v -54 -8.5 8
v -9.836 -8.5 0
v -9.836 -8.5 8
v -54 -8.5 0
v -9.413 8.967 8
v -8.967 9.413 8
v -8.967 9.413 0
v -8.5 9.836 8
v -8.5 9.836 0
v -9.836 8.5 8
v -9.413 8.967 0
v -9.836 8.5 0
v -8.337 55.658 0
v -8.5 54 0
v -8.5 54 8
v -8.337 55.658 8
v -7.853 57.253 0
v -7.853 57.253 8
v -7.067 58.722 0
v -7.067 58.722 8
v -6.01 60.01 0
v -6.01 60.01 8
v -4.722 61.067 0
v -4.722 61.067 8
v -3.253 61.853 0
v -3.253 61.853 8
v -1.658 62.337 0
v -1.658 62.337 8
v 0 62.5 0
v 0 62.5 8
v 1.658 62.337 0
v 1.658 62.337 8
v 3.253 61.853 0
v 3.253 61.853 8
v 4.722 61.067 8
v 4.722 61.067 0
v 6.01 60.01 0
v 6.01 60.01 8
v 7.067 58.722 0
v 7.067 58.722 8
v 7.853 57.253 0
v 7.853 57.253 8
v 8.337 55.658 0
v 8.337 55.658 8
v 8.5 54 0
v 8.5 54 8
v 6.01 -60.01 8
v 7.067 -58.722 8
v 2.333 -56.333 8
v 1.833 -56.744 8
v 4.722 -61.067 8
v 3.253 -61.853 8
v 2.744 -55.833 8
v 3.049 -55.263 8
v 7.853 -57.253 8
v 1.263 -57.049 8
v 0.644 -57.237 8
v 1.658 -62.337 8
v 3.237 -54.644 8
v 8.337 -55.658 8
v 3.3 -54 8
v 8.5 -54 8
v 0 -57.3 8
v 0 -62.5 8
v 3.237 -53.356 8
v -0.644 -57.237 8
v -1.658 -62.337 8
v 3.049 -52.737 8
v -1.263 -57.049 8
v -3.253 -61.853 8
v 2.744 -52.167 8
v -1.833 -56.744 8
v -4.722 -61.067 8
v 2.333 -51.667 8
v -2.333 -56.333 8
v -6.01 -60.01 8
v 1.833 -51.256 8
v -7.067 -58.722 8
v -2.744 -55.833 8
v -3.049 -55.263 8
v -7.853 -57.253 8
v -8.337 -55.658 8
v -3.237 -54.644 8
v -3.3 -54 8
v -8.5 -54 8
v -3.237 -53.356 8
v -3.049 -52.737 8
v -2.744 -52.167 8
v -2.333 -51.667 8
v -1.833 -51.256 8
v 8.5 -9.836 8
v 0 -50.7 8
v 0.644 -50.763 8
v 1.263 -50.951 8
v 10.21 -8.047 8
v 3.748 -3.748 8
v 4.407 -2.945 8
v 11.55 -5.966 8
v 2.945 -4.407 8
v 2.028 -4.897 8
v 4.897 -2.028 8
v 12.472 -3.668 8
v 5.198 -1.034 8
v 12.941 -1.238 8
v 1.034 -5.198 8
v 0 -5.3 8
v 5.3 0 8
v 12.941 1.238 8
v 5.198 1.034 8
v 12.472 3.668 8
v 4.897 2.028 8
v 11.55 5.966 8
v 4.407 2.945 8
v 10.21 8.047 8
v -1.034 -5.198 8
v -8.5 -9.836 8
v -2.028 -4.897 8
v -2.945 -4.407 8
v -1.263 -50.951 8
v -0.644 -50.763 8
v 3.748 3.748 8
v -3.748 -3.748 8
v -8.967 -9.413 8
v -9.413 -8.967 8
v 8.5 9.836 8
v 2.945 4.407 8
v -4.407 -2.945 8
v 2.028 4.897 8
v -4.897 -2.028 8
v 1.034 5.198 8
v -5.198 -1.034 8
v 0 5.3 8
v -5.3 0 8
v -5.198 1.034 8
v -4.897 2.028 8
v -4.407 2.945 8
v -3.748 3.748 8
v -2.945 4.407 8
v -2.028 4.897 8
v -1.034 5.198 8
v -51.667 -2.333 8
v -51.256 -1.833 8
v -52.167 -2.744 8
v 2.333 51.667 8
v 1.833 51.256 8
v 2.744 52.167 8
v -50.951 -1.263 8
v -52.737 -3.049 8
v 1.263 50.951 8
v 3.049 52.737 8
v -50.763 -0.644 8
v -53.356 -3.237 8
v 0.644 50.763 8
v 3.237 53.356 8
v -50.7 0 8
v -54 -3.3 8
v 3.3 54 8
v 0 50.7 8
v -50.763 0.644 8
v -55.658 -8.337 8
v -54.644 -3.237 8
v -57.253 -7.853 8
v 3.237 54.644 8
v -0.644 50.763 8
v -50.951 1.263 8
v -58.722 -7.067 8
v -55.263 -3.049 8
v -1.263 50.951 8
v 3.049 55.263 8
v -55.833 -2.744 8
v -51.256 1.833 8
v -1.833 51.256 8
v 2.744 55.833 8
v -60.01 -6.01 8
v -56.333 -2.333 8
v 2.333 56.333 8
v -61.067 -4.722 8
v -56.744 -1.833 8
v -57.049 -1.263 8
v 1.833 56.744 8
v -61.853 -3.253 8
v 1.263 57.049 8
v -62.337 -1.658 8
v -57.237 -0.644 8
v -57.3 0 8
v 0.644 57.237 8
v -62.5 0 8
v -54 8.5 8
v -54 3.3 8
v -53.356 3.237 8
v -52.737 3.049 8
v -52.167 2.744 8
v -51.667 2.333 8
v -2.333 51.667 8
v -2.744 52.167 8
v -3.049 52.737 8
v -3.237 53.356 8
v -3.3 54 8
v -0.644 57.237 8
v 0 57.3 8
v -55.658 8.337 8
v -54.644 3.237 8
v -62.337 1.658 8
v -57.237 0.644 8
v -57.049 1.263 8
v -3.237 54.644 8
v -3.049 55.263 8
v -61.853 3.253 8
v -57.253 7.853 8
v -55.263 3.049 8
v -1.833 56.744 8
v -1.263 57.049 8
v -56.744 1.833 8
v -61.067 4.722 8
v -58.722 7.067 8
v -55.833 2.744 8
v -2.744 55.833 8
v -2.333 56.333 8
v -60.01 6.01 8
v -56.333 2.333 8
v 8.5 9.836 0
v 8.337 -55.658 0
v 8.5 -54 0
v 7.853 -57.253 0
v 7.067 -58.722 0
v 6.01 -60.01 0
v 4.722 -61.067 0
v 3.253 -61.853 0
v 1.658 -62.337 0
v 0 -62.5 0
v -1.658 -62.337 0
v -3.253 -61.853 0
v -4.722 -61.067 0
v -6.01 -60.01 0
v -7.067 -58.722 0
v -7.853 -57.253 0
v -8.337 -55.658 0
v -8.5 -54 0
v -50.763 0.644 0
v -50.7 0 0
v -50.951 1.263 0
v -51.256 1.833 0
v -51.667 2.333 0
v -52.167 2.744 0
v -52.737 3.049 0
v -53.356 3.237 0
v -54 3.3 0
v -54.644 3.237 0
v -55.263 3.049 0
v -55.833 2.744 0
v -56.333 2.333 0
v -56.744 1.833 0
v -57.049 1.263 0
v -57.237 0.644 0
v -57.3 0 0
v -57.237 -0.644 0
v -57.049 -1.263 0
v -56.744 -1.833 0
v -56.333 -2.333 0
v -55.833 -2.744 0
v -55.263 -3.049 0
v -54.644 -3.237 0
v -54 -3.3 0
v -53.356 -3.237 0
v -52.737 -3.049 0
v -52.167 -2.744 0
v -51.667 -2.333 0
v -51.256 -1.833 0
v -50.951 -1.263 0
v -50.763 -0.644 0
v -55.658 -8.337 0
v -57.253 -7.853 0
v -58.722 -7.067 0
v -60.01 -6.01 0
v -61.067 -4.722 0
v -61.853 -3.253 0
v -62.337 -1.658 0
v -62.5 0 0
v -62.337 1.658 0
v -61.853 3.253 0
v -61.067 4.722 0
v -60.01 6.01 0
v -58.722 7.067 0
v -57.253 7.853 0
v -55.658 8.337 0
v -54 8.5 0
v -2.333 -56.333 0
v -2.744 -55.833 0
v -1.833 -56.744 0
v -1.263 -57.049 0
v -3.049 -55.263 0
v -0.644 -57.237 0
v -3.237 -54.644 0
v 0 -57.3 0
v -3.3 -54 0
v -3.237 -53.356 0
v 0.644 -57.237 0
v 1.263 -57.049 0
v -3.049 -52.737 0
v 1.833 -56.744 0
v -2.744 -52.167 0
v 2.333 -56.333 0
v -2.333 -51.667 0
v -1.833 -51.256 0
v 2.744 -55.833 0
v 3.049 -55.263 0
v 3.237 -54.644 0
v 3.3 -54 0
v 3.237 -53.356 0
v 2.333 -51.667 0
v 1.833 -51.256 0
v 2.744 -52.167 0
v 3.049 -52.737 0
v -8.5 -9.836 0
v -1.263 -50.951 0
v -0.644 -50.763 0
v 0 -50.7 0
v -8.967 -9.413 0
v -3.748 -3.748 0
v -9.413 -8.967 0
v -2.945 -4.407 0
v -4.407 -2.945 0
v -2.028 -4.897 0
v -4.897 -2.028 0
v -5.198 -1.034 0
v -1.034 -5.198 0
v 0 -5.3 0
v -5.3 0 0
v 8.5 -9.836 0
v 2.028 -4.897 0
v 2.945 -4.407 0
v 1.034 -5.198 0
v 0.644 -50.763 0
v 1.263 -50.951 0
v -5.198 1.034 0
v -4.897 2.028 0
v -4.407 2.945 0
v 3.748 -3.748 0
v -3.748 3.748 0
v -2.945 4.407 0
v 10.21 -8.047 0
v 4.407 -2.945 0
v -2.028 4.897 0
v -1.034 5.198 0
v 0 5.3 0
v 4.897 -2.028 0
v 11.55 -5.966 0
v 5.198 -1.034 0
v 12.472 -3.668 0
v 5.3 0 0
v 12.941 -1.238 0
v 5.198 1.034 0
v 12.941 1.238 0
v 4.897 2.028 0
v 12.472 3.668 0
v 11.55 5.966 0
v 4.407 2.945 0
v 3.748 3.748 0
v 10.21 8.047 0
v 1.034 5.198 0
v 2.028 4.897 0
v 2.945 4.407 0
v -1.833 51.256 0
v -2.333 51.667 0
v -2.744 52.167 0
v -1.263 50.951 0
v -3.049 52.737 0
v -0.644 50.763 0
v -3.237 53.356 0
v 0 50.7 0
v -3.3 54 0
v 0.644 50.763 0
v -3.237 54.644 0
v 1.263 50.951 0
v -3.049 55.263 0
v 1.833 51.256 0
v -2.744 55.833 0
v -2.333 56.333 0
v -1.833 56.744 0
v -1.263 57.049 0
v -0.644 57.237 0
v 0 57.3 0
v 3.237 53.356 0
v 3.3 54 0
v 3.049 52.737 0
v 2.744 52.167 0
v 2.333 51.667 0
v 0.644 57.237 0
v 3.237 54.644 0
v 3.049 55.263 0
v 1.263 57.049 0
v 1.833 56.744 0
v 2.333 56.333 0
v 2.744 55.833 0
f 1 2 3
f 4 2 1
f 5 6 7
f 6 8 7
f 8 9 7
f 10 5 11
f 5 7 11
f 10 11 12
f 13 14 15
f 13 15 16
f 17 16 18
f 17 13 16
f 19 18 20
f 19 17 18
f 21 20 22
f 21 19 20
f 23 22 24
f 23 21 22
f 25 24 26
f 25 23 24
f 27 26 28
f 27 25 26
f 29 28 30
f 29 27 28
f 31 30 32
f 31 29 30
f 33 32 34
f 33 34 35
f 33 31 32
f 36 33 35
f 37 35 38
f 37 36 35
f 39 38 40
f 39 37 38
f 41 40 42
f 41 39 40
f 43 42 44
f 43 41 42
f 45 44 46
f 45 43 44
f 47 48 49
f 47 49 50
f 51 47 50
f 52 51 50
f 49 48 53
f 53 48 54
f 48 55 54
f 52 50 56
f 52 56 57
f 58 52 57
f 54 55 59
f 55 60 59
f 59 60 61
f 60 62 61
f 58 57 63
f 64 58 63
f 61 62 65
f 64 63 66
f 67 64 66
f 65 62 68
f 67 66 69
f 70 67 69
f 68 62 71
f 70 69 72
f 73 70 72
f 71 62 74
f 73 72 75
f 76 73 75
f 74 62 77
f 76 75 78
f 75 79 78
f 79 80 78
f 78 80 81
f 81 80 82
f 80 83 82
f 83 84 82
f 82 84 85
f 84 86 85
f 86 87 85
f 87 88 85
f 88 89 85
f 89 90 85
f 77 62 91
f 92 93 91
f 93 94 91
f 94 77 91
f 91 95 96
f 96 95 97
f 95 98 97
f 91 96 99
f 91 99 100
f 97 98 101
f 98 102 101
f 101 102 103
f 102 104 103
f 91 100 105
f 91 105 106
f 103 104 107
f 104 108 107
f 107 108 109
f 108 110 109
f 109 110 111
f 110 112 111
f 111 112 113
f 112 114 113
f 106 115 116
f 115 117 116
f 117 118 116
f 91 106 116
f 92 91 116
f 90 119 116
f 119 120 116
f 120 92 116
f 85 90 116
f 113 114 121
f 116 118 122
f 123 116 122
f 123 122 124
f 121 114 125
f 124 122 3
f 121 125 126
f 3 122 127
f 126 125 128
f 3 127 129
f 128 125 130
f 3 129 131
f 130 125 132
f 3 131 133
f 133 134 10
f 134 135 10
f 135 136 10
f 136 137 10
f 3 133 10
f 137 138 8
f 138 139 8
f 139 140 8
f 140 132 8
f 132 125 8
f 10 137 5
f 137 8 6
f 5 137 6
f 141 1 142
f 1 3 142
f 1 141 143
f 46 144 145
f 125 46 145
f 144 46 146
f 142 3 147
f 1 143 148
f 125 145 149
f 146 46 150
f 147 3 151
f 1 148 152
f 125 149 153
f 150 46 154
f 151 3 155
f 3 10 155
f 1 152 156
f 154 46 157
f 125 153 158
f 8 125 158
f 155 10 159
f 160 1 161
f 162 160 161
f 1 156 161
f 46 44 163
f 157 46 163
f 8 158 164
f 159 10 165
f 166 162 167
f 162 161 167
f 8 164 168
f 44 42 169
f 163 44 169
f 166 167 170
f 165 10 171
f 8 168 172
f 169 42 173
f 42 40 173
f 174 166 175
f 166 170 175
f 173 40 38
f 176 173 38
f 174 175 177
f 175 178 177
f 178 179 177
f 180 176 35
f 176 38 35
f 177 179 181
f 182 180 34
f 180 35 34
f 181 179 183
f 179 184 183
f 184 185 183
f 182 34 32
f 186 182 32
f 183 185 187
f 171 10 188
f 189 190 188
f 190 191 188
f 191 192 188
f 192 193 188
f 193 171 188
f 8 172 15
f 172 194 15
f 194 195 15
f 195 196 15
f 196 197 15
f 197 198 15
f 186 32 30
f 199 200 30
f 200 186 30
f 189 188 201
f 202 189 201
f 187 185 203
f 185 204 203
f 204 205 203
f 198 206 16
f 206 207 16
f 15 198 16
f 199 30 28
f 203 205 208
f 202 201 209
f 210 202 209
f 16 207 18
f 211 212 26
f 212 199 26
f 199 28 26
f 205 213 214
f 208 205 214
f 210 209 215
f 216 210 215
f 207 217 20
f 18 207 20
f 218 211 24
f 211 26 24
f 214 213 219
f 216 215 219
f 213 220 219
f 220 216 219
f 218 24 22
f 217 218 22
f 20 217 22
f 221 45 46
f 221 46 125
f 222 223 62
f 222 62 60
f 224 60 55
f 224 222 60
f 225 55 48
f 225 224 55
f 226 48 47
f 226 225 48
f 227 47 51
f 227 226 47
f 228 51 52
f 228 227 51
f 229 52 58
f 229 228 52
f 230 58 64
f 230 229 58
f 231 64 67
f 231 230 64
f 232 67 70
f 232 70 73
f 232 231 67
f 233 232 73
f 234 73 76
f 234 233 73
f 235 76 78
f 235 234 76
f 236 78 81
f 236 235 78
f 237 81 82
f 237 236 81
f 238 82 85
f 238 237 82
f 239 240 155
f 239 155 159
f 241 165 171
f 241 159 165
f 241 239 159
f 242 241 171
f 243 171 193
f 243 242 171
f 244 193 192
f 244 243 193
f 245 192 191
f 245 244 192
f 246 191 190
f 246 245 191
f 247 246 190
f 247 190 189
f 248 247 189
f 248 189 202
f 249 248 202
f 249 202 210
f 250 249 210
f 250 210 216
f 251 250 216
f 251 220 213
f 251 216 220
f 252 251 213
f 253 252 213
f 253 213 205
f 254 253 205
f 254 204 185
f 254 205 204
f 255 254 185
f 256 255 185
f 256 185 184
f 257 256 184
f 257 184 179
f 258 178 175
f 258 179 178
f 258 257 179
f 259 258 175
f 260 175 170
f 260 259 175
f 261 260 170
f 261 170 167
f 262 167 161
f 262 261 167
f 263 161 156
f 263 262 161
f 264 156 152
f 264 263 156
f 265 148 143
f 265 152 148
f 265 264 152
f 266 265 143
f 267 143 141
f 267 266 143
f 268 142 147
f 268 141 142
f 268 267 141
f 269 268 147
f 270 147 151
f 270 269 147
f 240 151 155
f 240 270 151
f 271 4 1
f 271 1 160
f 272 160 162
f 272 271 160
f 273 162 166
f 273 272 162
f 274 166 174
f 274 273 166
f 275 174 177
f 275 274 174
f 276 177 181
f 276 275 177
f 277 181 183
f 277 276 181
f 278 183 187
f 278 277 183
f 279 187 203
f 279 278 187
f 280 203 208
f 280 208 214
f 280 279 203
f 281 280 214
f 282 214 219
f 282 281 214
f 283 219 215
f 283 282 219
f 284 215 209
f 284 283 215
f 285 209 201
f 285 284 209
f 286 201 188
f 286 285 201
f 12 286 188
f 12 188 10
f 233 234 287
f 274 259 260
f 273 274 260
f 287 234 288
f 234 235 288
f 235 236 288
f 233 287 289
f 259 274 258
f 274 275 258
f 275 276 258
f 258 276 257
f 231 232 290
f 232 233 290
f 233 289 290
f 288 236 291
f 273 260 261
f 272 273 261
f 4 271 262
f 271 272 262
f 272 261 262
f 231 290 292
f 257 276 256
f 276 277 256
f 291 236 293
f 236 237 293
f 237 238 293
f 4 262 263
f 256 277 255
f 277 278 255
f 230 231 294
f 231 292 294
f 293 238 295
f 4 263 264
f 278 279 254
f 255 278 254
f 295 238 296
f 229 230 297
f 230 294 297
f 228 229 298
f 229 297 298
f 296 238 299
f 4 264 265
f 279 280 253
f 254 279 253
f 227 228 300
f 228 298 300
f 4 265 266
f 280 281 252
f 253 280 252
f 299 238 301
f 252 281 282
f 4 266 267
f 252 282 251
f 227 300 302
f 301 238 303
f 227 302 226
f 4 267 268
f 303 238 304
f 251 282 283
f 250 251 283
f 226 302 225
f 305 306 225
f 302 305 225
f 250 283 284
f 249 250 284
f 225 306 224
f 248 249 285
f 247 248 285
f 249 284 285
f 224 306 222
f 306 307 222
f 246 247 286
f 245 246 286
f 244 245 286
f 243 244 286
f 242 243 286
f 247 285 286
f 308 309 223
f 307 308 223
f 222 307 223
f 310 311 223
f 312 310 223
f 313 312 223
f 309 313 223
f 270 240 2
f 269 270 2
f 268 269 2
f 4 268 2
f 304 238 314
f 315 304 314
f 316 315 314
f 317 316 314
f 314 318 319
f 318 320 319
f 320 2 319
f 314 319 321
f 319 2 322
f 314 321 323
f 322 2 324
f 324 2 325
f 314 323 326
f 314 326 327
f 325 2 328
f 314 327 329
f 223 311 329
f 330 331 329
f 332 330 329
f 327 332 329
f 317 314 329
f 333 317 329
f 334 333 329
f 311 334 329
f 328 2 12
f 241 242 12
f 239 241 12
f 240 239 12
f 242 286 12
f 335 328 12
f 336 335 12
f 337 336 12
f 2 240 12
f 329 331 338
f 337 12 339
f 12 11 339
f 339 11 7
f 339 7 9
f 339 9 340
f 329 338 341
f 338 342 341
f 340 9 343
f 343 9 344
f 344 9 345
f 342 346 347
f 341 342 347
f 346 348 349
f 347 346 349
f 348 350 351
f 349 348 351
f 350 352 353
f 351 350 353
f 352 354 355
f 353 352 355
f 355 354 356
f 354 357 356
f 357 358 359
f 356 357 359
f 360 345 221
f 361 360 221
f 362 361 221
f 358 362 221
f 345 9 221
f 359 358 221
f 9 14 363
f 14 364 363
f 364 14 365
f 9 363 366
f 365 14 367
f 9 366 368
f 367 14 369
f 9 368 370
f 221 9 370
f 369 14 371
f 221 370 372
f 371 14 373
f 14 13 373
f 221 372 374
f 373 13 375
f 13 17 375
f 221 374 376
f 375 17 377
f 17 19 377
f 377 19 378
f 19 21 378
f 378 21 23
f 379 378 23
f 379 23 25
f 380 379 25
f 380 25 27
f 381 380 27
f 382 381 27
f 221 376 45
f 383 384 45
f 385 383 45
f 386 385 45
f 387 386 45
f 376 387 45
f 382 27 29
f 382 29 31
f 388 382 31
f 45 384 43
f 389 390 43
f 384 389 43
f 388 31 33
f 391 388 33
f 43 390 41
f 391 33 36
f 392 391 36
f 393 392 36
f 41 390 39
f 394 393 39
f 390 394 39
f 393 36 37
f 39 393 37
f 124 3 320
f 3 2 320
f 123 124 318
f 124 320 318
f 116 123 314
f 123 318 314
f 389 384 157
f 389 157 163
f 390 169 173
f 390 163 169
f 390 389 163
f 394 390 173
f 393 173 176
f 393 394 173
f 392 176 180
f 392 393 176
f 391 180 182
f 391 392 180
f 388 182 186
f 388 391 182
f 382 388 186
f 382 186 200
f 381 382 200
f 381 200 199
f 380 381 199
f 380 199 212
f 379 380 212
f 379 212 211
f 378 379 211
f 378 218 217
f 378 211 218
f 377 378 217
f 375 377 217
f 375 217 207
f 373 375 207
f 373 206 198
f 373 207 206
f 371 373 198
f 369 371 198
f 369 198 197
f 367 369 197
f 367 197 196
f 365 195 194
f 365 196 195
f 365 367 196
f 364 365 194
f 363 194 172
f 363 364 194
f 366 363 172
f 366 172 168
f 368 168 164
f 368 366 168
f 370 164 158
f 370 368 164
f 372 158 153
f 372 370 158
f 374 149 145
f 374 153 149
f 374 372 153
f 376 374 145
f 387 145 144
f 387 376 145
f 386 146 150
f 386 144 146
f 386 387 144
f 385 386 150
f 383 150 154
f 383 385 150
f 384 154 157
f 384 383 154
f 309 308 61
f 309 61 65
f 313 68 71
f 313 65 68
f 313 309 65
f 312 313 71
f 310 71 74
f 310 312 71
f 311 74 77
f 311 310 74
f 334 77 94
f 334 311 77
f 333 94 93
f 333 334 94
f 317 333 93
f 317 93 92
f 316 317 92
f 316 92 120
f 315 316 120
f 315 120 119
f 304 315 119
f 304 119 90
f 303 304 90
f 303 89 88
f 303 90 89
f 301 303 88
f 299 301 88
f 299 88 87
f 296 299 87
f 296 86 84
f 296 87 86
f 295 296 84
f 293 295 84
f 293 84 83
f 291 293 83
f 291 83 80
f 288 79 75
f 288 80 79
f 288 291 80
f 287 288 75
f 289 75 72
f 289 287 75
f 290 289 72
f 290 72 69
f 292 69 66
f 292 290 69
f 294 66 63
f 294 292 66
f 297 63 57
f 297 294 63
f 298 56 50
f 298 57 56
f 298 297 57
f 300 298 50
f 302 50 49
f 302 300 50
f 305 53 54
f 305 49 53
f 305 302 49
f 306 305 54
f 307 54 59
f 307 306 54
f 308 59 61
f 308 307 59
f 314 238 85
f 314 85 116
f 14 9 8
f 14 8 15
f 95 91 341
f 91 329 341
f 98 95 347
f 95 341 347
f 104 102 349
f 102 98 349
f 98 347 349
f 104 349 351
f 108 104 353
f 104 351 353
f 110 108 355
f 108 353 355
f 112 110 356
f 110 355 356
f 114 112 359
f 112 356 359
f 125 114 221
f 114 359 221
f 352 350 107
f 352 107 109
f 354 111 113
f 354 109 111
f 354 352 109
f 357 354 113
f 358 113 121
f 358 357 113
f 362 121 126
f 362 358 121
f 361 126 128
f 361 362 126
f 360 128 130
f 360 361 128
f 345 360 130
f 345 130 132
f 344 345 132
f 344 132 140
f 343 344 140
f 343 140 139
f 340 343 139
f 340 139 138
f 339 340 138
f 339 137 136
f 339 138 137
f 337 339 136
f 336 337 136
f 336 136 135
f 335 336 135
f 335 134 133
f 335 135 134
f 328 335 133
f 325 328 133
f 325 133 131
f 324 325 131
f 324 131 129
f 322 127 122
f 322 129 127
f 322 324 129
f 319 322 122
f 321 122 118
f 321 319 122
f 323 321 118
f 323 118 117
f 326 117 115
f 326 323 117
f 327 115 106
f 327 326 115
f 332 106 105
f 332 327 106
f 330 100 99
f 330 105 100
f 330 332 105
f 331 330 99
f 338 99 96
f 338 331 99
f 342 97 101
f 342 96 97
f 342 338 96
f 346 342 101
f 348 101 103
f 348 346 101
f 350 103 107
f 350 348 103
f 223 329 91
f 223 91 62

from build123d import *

# Parameters (mm, degrees)
S01_CENTRAL_SPINDLE_PAD_R         = 13
F_01_CENTRAL_SPINDLE_PAD_DEPTH    = 8
F_02_CAGE_RIB_1_DEPTH             = 8
F_03_CAGE_RIB_2_DEPTH             = 8
F_04_CAGE_RIB_3_DEPTH             = 8
F_05_START                        = -1
S05_THREE_CAGE_BOLT_HOLES_R       = 3.3
F_05_THREE_CAGE_BOLT_HOLES_DEPTH  = 10
F_06_START                        = -1
S06_SPINDLE_STEM_CLEARANCE_R      = 5.3
F_06_SPINDLE_STEM_CLEARANCE_DEPTH = 10


with BuildPart() as part:
    # S01 - Central spindle pad → 01 - Central spindle pad (new body)
    with BuildSketch(Plane.XY):
        Circle(S01_CENTRAL_SPINDLE_PAD_R)
    extrude(amount=F_01_CENTRAL_SPINDLE_PAD_DEPTH)

    # S02 - Cage rib 1 → 02 - Cage rib 1 (add)
    with BuildSketch(Plane.XY):
        with BuildLine():
            Line((-8.5, 0), (-8.5, 54))
            ThreePointArc((-8.5, 54), (0, 62.5), (8.5, 54))
            Line((8.5, 54), (8.5, 0))
            ThreePointArc((8.5, 0), (0, -8.5), (-8.5, 0))
        make_face()
    extrude(amount=F_02_CAGE_RIB_1_DEPTH)

    # S03 - Cage rib 2 → 03 - Cage rib 2 (add)
    with BuildSketch(Plane.XY):
        with BuildLine():
            Line((0, -8.5), (-54, -8.5))
            ThreePointArc((-54, -8.5), (-62.5, 0), (-54, 8.5))
            Line((-54, 8.5), (0, 8.5))
            ThreePointArc((0, 8.5), (8.5, 0), (0, -8.5))
        make_face()
    extrude(amount=F_03_CAGE_RIB_2_DEPTH)

    # S04 - Cage rib 3 → 04 - Cage rib 3 (add)
    with BuildSketch(Plane.XY):
        with BuildLine():
            Line((8.5, 0), (8.5, -54))
            ThreePointArc((8.5, -54), (0, -62.5), (-8.5, -54))
            Line((-8.5, -54), (-8.5, 0))
            ThreePointArc((-8.5, 0), (0, 8.5), (8.5, 0))
        make_face()
    extrude(amount=F_04_CAGE_RIB_3_DEPTH)

    # S05 - Three cage bolt holes → 05 - Three cage bolt holes (cut)
    with BuildSketch(Plane.XY.offset(F_05_START)):
        with Locations((0, 54)):
            Circle(S05_THREE_CAGE_BOLT_HOLES_R)
        with Locations((-54, 0)):
            Circle(S05_THREE_CAGE_BOLT_HOLES_R)
        with Locations((0, -54)):
            Circle(S05_THREE_CAGE_BOLT_HOLES_R)
    extrude(amount=F_05_THREE_CAGE_BOLT_HOLES_DEPTH, mode=Mode.SUBTRACT)

    # S06 - Spindle stem clearance → 06 - Spindle stem clearance (cut)
    with BuildSketch(Plane.XY.offset(F_06_START)):
        Circle(S06_SPINDLE_STEM_CLEARANCE_R)
    extrude(amount=F_06_SPINDLE_STEM_CLEARANCE_DEPTH, mode=Mode.SUBTRACT)


solid = part.part
